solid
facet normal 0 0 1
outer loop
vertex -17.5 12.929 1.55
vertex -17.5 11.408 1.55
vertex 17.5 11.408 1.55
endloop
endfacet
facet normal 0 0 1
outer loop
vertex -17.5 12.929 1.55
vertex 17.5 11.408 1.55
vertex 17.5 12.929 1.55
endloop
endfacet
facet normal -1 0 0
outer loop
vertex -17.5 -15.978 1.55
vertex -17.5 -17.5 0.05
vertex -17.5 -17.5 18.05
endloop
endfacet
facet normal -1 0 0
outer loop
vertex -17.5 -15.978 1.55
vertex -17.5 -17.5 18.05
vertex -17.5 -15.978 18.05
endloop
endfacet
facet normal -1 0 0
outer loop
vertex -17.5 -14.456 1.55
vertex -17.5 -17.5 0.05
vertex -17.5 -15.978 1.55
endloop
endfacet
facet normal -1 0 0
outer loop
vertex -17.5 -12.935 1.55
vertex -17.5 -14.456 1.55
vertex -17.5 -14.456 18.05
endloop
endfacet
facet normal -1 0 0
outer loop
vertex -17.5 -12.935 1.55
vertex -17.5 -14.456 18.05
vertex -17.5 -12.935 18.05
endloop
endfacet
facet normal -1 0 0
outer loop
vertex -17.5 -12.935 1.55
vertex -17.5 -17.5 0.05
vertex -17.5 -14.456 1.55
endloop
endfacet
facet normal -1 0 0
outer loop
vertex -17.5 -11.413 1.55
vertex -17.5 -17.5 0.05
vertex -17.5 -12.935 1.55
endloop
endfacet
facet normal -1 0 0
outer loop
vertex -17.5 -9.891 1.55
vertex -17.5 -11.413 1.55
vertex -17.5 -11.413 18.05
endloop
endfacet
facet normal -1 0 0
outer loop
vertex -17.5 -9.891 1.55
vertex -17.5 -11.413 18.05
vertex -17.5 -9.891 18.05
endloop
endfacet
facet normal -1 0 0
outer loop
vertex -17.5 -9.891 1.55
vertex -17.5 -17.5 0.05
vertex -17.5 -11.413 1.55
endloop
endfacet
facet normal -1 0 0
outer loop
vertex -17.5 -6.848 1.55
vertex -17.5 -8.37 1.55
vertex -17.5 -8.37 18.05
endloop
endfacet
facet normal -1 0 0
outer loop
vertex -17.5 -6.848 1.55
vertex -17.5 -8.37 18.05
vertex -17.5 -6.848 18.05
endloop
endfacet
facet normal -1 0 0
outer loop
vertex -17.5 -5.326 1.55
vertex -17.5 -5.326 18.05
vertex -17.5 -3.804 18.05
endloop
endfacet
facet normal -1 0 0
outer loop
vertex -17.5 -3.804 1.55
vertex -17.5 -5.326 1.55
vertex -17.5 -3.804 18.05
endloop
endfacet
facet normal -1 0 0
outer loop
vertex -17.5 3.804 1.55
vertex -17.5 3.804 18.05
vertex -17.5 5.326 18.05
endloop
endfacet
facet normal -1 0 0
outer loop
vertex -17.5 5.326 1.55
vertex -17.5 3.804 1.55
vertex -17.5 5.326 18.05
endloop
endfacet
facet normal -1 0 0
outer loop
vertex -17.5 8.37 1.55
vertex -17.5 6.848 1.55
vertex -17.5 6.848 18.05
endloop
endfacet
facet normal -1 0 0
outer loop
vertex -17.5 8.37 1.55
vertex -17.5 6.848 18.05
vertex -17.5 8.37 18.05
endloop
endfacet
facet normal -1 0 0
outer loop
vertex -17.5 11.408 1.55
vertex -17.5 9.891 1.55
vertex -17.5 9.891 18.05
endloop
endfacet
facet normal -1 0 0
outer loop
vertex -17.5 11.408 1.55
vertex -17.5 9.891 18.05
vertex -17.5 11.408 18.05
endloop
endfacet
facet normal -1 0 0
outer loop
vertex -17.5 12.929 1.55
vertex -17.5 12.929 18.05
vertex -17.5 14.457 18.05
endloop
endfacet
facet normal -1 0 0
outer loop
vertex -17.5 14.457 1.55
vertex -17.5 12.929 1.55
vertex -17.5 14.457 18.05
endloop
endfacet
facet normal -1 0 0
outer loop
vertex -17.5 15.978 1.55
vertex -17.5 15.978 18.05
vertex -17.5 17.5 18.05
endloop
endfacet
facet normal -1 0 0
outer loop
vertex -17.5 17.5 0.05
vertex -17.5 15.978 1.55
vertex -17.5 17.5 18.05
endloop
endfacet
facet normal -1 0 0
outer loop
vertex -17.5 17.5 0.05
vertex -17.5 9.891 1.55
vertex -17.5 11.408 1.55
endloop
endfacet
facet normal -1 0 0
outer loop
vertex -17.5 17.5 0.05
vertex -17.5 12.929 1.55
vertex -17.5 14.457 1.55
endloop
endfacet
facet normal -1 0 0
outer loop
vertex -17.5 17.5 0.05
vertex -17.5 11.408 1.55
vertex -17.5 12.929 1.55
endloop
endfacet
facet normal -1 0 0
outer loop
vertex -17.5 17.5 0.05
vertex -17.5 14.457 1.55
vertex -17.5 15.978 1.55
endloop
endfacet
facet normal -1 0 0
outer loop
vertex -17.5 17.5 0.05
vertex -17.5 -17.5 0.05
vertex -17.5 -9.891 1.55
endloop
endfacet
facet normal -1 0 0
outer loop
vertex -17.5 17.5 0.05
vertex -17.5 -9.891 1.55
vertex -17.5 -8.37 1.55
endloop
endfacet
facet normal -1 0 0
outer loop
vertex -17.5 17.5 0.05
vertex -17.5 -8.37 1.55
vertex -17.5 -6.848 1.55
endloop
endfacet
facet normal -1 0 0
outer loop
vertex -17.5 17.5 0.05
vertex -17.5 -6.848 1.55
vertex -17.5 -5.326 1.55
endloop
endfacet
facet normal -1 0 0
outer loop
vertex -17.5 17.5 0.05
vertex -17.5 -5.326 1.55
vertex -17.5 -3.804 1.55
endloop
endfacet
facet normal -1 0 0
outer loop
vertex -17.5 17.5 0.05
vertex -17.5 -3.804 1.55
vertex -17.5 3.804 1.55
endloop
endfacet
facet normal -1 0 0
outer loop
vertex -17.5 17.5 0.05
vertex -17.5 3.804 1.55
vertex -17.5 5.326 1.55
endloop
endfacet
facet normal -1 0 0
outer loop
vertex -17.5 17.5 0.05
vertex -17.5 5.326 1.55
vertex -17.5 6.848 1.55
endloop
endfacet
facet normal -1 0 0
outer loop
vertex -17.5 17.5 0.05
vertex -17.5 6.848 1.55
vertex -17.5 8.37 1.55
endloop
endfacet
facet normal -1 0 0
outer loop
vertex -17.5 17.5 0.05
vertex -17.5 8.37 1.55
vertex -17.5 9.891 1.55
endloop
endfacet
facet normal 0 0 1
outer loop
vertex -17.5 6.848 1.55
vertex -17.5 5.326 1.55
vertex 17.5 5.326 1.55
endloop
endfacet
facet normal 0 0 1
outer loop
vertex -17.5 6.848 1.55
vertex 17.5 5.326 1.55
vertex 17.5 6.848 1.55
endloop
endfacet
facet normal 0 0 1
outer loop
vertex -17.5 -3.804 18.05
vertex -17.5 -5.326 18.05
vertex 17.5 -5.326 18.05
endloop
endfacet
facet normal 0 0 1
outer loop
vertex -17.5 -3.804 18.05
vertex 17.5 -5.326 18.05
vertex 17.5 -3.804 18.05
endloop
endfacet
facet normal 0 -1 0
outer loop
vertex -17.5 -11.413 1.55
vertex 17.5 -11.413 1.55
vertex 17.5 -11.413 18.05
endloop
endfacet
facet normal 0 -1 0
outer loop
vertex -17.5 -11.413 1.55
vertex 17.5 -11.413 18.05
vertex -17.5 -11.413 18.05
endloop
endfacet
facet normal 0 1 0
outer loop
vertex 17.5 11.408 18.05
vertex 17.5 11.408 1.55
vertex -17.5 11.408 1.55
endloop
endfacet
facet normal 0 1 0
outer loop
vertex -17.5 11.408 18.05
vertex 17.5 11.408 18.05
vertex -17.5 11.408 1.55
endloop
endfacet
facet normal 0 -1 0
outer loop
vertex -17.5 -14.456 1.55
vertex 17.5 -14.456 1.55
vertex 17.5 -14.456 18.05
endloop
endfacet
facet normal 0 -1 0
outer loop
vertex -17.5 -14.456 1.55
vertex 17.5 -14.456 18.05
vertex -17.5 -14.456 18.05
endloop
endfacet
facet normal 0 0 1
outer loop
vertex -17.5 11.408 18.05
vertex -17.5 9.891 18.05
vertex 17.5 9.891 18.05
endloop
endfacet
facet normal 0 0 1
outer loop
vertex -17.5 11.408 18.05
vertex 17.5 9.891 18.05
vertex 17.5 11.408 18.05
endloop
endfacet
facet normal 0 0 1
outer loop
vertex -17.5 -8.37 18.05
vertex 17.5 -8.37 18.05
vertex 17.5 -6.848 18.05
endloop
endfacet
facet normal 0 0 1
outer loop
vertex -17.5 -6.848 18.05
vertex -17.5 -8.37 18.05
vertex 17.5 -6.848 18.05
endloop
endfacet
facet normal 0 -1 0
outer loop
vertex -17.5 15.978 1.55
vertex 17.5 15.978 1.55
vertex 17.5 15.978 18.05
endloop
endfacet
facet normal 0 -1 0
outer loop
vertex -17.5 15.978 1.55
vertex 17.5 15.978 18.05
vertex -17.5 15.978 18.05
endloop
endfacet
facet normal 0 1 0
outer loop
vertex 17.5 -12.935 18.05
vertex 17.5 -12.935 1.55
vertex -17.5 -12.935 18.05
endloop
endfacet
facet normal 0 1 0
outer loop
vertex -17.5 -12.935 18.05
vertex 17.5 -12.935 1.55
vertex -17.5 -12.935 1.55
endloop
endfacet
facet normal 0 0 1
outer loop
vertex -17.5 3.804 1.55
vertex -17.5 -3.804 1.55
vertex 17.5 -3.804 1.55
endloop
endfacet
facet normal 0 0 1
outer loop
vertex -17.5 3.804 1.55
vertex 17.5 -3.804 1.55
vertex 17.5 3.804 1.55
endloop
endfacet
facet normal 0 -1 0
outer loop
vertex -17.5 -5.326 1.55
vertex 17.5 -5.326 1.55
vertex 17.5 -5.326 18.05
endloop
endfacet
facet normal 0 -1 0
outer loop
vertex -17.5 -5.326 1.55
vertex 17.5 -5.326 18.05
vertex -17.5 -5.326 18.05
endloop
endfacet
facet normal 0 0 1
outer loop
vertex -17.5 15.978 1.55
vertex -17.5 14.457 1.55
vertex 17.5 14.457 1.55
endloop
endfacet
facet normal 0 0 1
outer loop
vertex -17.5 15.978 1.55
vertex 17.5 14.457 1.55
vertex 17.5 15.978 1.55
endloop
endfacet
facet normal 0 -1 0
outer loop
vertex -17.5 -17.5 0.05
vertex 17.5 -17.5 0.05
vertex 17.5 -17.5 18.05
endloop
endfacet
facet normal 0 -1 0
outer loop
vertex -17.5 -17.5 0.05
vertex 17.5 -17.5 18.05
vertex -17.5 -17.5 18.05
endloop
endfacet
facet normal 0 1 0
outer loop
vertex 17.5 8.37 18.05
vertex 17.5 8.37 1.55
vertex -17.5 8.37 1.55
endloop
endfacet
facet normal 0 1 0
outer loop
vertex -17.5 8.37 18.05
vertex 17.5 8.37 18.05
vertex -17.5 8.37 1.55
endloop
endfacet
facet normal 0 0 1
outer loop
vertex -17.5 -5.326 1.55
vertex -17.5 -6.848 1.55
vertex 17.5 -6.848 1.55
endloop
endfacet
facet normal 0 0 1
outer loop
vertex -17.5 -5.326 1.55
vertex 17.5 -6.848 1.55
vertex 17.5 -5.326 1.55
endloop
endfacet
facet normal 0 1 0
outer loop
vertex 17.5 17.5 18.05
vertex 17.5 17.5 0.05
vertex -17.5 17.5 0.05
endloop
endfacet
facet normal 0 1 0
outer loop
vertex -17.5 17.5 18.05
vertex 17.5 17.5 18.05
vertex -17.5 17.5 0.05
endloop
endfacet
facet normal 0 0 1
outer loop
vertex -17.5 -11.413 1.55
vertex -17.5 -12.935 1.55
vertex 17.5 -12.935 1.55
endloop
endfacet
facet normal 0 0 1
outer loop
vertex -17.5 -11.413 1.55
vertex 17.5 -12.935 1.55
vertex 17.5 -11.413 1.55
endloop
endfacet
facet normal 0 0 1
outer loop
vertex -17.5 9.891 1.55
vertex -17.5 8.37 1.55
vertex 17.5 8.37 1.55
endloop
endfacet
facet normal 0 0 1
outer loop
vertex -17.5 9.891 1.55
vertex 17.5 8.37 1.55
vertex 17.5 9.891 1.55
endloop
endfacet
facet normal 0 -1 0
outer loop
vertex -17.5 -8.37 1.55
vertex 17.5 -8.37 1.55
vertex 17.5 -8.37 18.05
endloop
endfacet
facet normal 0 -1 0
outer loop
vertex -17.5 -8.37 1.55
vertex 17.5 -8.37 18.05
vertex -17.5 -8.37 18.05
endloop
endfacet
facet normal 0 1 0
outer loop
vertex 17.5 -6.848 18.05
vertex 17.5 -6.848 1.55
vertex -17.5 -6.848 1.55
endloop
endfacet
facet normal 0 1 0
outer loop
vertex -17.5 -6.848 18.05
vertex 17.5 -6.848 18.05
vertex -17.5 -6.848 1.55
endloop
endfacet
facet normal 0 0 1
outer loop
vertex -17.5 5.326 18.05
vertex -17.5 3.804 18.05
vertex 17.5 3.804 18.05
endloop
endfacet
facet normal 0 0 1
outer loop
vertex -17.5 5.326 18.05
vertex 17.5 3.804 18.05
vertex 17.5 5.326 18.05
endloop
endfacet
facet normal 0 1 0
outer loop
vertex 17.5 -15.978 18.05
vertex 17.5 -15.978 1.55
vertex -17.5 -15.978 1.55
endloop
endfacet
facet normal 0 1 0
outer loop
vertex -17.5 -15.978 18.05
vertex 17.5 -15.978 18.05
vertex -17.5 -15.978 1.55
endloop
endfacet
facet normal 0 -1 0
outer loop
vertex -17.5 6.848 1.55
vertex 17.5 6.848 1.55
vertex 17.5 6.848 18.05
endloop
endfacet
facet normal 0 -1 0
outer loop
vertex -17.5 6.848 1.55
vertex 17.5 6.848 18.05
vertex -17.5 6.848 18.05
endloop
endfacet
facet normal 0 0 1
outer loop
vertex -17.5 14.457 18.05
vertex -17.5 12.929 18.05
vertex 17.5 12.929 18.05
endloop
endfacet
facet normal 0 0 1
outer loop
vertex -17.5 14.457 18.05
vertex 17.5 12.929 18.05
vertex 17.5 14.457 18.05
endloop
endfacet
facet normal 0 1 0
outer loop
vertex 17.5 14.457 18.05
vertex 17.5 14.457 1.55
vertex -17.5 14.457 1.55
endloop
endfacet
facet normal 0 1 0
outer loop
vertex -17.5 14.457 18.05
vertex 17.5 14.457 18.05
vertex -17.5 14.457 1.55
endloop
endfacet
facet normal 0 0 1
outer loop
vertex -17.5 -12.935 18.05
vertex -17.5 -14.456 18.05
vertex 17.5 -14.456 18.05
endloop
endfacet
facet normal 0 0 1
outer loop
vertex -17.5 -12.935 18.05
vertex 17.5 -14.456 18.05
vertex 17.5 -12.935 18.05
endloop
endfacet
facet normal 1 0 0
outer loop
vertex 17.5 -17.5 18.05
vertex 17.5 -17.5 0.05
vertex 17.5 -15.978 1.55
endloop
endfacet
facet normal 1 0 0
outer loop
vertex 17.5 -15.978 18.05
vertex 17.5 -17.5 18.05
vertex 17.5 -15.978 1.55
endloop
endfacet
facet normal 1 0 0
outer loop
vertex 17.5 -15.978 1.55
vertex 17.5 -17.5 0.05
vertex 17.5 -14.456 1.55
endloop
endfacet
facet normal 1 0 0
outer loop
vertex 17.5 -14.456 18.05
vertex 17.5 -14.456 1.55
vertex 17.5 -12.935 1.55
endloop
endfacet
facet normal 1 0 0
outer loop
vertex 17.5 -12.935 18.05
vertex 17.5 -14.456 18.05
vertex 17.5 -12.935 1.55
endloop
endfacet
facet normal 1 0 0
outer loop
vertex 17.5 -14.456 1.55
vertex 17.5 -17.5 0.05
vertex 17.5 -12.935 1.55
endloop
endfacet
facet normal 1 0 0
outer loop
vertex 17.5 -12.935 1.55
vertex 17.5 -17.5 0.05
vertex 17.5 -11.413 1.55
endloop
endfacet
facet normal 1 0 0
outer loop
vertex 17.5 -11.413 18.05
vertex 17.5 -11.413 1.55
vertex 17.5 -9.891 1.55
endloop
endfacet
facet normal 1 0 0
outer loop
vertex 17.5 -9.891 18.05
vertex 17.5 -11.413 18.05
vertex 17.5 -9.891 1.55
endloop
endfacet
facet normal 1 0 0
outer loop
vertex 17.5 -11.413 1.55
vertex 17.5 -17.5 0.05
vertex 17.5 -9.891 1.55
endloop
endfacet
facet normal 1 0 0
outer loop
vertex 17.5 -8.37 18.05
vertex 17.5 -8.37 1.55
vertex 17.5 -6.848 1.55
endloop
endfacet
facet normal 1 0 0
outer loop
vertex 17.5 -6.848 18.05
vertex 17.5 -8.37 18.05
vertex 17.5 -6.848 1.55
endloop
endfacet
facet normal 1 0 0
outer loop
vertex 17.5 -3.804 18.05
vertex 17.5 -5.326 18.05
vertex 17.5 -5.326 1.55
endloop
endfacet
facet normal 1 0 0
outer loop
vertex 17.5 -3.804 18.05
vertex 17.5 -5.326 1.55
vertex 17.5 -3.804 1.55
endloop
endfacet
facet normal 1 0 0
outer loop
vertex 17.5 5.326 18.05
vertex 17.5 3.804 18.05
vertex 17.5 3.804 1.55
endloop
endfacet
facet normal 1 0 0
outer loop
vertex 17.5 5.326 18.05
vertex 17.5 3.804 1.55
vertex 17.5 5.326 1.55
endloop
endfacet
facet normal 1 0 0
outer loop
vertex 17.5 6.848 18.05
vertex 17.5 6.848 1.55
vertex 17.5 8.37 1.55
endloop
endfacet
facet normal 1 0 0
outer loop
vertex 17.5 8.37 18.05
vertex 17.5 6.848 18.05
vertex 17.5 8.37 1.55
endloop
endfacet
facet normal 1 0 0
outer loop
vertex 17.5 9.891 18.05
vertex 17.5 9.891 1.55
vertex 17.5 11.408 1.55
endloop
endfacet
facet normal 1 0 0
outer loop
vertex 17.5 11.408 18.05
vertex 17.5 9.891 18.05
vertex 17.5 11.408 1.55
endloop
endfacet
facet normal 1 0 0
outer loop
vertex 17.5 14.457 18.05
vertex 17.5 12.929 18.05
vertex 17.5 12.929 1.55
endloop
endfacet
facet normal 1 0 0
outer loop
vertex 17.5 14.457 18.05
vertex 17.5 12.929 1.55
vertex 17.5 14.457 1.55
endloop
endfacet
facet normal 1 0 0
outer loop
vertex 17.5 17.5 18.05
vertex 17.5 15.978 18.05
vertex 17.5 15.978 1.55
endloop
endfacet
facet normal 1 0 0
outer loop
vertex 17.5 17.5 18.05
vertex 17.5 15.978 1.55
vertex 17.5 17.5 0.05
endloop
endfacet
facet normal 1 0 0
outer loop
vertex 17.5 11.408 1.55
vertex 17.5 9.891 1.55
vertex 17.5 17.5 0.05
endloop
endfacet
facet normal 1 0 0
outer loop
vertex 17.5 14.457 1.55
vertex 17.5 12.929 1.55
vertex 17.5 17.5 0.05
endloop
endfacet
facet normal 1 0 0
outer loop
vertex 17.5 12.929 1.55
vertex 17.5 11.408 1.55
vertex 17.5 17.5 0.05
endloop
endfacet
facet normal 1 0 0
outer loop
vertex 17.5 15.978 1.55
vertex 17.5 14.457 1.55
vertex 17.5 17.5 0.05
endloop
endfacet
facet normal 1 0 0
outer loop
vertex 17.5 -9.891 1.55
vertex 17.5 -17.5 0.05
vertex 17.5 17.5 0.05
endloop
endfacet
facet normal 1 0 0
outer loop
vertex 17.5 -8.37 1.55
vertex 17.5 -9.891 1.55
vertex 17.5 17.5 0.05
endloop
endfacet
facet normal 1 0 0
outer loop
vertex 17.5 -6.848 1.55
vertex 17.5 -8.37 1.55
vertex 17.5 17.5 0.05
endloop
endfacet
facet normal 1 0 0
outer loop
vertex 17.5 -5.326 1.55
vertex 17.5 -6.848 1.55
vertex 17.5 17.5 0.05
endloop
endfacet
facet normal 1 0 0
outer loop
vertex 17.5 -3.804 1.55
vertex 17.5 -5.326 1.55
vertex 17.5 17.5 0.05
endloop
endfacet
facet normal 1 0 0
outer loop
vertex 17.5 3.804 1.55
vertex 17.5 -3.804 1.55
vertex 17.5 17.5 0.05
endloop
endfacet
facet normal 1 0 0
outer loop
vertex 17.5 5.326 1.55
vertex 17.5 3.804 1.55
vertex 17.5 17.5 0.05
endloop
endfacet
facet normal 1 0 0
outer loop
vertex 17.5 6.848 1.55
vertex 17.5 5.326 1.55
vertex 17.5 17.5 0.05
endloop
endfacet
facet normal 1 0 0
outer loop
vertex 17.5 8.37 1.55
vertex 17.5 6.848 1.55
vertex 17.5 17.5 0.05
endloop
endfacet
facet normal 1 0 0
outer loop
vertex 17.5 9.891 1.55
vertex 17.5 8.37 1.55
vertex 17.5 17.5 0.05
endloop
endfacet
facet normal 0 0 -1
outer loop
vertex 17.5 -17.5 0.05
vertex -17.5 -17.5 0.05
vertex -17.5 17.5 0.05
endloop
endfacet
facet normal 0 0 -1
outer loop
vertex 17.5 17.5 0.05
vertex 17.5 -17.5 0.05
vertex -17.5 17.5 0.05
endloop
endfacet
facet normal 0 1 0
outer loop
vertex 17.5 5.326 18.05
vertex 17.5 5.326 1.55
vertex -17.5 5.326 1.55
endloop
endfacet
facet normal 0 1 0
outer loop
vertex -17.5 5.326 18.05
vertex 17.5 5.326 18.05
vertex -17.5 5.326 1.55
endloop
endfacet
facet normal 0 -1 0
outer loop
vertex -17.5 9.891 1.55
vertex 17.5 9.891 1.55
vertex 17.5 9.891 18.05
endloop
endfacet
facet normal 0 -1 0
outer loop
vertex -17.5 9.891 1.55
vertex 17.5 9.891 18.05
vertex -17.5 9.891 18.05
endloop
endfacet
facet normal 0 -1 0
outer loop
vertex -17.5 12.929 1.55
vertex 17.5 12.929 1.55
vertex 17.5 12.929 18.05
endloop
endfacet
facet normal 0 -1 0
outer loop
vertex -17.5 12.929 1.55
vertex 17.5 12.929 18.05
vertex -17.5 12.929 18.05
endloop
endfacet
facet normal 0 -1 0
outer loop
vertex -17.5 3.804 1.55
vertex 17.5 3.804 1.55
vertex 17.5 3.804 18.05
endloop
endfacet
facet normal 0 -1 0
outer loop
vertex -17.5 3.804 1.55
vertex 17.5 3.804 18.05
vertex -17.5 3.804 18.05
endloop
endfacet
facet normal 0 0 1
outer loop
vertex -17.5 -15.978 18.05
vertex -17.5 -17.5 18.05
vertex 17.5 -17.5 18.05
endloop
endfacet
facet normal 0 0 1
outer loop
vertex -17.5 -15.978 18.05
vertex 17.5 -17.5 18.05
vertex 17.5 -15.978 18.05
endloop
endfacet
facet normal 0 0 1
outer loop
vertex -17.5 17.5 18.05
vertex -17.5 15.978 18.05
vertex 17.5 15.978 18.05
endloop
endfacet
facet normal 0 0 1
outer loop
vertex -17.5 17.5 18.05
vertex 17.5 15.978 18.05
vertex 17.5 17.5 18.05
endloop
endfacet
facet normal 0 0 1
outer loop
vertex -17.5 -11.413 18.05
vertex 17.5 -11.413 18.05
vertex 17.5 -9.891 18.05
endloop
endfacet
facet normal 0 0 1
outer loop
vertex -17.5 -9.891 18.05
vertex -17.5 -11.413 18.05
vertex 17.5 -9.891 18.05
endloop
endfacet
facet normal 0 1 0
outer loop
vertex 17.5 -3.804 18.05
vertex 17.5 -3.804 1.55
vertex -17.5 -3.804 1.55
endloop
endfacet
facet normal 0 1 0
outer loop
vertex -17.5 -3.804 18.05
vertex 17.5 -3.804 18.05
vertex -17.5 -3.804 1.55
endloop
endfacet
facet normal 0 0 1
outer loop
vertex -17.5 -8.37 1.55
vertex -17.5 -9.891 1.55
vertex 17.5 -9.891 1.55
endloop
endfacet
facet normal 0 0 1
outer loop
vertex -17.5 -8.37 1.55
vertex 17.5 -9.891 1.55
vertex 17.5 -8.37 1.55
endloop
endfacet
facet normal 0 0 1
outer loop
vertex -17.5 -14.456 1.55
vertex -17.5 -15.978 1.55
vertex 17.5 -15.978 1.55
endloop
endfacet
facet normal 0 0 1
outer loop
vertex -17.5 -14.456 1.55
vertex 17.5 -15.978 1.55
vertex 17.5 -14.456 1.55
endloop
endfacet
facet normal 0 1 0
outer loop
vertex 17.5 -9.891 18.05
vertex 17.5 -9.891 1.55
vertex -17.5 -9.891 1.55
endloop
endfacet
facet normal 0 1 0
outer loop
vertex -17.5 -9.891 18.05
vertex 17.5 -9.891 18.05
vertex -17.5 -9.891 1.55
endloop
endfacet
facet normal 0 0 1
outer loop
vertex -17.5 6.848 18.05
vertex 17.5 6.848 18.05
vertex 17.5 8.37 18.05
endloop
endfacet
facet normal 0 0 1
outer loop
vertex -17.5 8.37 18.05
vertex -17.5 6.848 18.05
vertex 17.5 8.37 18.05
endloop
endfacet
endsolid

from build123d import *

# Parameters (mm, degrees)
BOX_W                = 35
BOX_H                = 35
BOX_DEPTH            = 18
BOX001_W             = 1.5217
BOX001_H             = 35
BOX001_DEPTH         = 16.5
BOX002_W             = 1.5217
BOX002_H             = 35
BOX002_DEPTH         = 16.5
BOX003_W             = 1.5217
BOX003_H             = 35
BOX003_DEPTH         = 16.5
BOX004_W             = 1.5217
BOX004_H             = 35
BOX004_DEPTH         = 16.5
BOX005_W             = 7.6087
BOX005_H             = 35
BOX005_DEPTH         = 16.5
BOX006_W             = 1.5217
BOX006_H             = 35
BOX006_DEPTH         = 16.5
BOX007_W             = 1.5217
BOX007_H             = 35
BOX007_DEPTH         = 16.5
BOX008_W             = 1.5217
BOX008_H             = 35
BOX008_DEPTH         = 16.5
BOX009_W             = 1.5217
BOX009_H             = 35
BOX009_DEPTH         = 16.5
BODY_PLACEMENT_ANGLE = 90


with BuildPart() as part:
    # Box → Box (join)
    with BuildSketch(Plane(origin=(-17.5, -17.5, 0), x_dir=(1, 0, 0), z_dir=(0, 0, 1))):
        with Locations((17.5, 17.5)):
            Rectangle(BOX_W, BOX_H)
    extrude(amount=BOX_DEPTH)

    # Box001 → Box001 (cut)
    with BuildSketch(Plane(origin=(-15.978, -17.5, 1.5), x_dir=(1, 0, 0), z_dir=(0, 0, 1))):
        with Locations((0.76085, 17.5)):
            Rectangle(BOX001_W, BOX001_H)
    extrude(amount=BOX001_DEPTH, mode=Mode.SUBTRACT)

    # Box002 → Box002 (cut)
    with BuildSketch(Plane(origin=(-12.9347, -17.5, 1.5), x_dir=(1, 0, 0), z_dir=(0, 0, 1))):
        with Locations((0.76085, 17.5)):
            Rectangle(BOX002_W, BOX002_H)
    extrude(amount=BOX002_DEPTH, mode=Mode.SUBTRACT)

    # Box003 → Box003 (cut)
    with BuildSketch(Plane(origin=(-9.891304, -17.5, 1.5), x_dir=(1, 0, 0), z_dir=(0, 0, 1))):
        with Locations((0.76085, 17.5)):
            Rectangle(BOX003_W, BOX003_H)
    extrude(amount=BOX003_DEPTH, mode=Mode.SUBTRACT)

    # Box004 → Box004 (cut)
    with BuildSketch(Plane(origin=(-6.84782, -17.5, 1.5), x_dir=(1, 0, 0), z_dir=(0, 0, 1))):
        with Locations((0.76085, 17.5)):
            Rectangle(BOX004_W, BOX004_H)
    extrude(amount=BOX004_DEPTH, mode=Mode.SUBTRACT)

    # Box005 → Box005 (cut)
    with BuildSketch(Plane(origin=(-3.80434, -17.5, 1.5), x_dir=(1, 0, 0), z_dir=(0, 0, 1))):
        with Locations((3.80435, 17.5)):
            Rectangle(BOX005_W, BOX005_H)
    extrude(amount=BOX005_DEPTH, mode=Mode.SUBTRACT)

    # Box006 → Box006 (cut)
    with BuildSketch(Plane(origin=(5.326088, -17.5, 1.5), x_dir=(1, 0, 0), z_dir=(0, 0, 1))):
        with Locations((0.76085, 17.5)):
            Rectangle(BOX006_W, BOX006_H)
    extrude(amount=BOX006_DEPTH, mode=Mode.SUBTRACT)

    # Box007 → Box007 (cut)
    with BuildSketch(Plane(origin=(8.369566, -17.5, 1.5), x_dir=(1, 0, 0), z_dir=(0, 0, 1))):
        with Locations((0.76085, 17.5)):
            Rectangle(BOX007_W, BOX007_H)
    extrude(amount=BOX007_DEPTH, mode=Mode.SUBTRACT)

    # Box008 → Box008 (cut)
    with BuildSketch(Plane(origin=(11.407644, -17.5, 1.5), x_dir=(1, 0, 0), z_dir=(0, 0, 1))):
        with Locations((0.76085, 17.5)):
            Rectangle(BOX008_W, BOX008_H)
    extrude(amount=BOX008_DEPTH, mode=Mode.SUBTRACT)

    # Box009 → Box009 (cut)
    with BuildSketch(Plane(origin=(14.456521, -17.5, 1.5), x_dir=(1, 0, 0), z_dir=(0, 0, 1))):
        with Locations((0.76085, 17.5)):
            Rectangle(BOX009_W, BOX009_H)
    extrude(amount=BOX009_DEPTH, mode=Mode.SUBTRACT)


with BuildPart() as part_1:
    # Body placement: moved
    add(part.part.moved(Location((0, 0, 0.05))).rotate(Axis((0, 0, 0.05), (0, 0, 1)), BODY_PLACEMENT_ANGLE))


solid = part_1.part
